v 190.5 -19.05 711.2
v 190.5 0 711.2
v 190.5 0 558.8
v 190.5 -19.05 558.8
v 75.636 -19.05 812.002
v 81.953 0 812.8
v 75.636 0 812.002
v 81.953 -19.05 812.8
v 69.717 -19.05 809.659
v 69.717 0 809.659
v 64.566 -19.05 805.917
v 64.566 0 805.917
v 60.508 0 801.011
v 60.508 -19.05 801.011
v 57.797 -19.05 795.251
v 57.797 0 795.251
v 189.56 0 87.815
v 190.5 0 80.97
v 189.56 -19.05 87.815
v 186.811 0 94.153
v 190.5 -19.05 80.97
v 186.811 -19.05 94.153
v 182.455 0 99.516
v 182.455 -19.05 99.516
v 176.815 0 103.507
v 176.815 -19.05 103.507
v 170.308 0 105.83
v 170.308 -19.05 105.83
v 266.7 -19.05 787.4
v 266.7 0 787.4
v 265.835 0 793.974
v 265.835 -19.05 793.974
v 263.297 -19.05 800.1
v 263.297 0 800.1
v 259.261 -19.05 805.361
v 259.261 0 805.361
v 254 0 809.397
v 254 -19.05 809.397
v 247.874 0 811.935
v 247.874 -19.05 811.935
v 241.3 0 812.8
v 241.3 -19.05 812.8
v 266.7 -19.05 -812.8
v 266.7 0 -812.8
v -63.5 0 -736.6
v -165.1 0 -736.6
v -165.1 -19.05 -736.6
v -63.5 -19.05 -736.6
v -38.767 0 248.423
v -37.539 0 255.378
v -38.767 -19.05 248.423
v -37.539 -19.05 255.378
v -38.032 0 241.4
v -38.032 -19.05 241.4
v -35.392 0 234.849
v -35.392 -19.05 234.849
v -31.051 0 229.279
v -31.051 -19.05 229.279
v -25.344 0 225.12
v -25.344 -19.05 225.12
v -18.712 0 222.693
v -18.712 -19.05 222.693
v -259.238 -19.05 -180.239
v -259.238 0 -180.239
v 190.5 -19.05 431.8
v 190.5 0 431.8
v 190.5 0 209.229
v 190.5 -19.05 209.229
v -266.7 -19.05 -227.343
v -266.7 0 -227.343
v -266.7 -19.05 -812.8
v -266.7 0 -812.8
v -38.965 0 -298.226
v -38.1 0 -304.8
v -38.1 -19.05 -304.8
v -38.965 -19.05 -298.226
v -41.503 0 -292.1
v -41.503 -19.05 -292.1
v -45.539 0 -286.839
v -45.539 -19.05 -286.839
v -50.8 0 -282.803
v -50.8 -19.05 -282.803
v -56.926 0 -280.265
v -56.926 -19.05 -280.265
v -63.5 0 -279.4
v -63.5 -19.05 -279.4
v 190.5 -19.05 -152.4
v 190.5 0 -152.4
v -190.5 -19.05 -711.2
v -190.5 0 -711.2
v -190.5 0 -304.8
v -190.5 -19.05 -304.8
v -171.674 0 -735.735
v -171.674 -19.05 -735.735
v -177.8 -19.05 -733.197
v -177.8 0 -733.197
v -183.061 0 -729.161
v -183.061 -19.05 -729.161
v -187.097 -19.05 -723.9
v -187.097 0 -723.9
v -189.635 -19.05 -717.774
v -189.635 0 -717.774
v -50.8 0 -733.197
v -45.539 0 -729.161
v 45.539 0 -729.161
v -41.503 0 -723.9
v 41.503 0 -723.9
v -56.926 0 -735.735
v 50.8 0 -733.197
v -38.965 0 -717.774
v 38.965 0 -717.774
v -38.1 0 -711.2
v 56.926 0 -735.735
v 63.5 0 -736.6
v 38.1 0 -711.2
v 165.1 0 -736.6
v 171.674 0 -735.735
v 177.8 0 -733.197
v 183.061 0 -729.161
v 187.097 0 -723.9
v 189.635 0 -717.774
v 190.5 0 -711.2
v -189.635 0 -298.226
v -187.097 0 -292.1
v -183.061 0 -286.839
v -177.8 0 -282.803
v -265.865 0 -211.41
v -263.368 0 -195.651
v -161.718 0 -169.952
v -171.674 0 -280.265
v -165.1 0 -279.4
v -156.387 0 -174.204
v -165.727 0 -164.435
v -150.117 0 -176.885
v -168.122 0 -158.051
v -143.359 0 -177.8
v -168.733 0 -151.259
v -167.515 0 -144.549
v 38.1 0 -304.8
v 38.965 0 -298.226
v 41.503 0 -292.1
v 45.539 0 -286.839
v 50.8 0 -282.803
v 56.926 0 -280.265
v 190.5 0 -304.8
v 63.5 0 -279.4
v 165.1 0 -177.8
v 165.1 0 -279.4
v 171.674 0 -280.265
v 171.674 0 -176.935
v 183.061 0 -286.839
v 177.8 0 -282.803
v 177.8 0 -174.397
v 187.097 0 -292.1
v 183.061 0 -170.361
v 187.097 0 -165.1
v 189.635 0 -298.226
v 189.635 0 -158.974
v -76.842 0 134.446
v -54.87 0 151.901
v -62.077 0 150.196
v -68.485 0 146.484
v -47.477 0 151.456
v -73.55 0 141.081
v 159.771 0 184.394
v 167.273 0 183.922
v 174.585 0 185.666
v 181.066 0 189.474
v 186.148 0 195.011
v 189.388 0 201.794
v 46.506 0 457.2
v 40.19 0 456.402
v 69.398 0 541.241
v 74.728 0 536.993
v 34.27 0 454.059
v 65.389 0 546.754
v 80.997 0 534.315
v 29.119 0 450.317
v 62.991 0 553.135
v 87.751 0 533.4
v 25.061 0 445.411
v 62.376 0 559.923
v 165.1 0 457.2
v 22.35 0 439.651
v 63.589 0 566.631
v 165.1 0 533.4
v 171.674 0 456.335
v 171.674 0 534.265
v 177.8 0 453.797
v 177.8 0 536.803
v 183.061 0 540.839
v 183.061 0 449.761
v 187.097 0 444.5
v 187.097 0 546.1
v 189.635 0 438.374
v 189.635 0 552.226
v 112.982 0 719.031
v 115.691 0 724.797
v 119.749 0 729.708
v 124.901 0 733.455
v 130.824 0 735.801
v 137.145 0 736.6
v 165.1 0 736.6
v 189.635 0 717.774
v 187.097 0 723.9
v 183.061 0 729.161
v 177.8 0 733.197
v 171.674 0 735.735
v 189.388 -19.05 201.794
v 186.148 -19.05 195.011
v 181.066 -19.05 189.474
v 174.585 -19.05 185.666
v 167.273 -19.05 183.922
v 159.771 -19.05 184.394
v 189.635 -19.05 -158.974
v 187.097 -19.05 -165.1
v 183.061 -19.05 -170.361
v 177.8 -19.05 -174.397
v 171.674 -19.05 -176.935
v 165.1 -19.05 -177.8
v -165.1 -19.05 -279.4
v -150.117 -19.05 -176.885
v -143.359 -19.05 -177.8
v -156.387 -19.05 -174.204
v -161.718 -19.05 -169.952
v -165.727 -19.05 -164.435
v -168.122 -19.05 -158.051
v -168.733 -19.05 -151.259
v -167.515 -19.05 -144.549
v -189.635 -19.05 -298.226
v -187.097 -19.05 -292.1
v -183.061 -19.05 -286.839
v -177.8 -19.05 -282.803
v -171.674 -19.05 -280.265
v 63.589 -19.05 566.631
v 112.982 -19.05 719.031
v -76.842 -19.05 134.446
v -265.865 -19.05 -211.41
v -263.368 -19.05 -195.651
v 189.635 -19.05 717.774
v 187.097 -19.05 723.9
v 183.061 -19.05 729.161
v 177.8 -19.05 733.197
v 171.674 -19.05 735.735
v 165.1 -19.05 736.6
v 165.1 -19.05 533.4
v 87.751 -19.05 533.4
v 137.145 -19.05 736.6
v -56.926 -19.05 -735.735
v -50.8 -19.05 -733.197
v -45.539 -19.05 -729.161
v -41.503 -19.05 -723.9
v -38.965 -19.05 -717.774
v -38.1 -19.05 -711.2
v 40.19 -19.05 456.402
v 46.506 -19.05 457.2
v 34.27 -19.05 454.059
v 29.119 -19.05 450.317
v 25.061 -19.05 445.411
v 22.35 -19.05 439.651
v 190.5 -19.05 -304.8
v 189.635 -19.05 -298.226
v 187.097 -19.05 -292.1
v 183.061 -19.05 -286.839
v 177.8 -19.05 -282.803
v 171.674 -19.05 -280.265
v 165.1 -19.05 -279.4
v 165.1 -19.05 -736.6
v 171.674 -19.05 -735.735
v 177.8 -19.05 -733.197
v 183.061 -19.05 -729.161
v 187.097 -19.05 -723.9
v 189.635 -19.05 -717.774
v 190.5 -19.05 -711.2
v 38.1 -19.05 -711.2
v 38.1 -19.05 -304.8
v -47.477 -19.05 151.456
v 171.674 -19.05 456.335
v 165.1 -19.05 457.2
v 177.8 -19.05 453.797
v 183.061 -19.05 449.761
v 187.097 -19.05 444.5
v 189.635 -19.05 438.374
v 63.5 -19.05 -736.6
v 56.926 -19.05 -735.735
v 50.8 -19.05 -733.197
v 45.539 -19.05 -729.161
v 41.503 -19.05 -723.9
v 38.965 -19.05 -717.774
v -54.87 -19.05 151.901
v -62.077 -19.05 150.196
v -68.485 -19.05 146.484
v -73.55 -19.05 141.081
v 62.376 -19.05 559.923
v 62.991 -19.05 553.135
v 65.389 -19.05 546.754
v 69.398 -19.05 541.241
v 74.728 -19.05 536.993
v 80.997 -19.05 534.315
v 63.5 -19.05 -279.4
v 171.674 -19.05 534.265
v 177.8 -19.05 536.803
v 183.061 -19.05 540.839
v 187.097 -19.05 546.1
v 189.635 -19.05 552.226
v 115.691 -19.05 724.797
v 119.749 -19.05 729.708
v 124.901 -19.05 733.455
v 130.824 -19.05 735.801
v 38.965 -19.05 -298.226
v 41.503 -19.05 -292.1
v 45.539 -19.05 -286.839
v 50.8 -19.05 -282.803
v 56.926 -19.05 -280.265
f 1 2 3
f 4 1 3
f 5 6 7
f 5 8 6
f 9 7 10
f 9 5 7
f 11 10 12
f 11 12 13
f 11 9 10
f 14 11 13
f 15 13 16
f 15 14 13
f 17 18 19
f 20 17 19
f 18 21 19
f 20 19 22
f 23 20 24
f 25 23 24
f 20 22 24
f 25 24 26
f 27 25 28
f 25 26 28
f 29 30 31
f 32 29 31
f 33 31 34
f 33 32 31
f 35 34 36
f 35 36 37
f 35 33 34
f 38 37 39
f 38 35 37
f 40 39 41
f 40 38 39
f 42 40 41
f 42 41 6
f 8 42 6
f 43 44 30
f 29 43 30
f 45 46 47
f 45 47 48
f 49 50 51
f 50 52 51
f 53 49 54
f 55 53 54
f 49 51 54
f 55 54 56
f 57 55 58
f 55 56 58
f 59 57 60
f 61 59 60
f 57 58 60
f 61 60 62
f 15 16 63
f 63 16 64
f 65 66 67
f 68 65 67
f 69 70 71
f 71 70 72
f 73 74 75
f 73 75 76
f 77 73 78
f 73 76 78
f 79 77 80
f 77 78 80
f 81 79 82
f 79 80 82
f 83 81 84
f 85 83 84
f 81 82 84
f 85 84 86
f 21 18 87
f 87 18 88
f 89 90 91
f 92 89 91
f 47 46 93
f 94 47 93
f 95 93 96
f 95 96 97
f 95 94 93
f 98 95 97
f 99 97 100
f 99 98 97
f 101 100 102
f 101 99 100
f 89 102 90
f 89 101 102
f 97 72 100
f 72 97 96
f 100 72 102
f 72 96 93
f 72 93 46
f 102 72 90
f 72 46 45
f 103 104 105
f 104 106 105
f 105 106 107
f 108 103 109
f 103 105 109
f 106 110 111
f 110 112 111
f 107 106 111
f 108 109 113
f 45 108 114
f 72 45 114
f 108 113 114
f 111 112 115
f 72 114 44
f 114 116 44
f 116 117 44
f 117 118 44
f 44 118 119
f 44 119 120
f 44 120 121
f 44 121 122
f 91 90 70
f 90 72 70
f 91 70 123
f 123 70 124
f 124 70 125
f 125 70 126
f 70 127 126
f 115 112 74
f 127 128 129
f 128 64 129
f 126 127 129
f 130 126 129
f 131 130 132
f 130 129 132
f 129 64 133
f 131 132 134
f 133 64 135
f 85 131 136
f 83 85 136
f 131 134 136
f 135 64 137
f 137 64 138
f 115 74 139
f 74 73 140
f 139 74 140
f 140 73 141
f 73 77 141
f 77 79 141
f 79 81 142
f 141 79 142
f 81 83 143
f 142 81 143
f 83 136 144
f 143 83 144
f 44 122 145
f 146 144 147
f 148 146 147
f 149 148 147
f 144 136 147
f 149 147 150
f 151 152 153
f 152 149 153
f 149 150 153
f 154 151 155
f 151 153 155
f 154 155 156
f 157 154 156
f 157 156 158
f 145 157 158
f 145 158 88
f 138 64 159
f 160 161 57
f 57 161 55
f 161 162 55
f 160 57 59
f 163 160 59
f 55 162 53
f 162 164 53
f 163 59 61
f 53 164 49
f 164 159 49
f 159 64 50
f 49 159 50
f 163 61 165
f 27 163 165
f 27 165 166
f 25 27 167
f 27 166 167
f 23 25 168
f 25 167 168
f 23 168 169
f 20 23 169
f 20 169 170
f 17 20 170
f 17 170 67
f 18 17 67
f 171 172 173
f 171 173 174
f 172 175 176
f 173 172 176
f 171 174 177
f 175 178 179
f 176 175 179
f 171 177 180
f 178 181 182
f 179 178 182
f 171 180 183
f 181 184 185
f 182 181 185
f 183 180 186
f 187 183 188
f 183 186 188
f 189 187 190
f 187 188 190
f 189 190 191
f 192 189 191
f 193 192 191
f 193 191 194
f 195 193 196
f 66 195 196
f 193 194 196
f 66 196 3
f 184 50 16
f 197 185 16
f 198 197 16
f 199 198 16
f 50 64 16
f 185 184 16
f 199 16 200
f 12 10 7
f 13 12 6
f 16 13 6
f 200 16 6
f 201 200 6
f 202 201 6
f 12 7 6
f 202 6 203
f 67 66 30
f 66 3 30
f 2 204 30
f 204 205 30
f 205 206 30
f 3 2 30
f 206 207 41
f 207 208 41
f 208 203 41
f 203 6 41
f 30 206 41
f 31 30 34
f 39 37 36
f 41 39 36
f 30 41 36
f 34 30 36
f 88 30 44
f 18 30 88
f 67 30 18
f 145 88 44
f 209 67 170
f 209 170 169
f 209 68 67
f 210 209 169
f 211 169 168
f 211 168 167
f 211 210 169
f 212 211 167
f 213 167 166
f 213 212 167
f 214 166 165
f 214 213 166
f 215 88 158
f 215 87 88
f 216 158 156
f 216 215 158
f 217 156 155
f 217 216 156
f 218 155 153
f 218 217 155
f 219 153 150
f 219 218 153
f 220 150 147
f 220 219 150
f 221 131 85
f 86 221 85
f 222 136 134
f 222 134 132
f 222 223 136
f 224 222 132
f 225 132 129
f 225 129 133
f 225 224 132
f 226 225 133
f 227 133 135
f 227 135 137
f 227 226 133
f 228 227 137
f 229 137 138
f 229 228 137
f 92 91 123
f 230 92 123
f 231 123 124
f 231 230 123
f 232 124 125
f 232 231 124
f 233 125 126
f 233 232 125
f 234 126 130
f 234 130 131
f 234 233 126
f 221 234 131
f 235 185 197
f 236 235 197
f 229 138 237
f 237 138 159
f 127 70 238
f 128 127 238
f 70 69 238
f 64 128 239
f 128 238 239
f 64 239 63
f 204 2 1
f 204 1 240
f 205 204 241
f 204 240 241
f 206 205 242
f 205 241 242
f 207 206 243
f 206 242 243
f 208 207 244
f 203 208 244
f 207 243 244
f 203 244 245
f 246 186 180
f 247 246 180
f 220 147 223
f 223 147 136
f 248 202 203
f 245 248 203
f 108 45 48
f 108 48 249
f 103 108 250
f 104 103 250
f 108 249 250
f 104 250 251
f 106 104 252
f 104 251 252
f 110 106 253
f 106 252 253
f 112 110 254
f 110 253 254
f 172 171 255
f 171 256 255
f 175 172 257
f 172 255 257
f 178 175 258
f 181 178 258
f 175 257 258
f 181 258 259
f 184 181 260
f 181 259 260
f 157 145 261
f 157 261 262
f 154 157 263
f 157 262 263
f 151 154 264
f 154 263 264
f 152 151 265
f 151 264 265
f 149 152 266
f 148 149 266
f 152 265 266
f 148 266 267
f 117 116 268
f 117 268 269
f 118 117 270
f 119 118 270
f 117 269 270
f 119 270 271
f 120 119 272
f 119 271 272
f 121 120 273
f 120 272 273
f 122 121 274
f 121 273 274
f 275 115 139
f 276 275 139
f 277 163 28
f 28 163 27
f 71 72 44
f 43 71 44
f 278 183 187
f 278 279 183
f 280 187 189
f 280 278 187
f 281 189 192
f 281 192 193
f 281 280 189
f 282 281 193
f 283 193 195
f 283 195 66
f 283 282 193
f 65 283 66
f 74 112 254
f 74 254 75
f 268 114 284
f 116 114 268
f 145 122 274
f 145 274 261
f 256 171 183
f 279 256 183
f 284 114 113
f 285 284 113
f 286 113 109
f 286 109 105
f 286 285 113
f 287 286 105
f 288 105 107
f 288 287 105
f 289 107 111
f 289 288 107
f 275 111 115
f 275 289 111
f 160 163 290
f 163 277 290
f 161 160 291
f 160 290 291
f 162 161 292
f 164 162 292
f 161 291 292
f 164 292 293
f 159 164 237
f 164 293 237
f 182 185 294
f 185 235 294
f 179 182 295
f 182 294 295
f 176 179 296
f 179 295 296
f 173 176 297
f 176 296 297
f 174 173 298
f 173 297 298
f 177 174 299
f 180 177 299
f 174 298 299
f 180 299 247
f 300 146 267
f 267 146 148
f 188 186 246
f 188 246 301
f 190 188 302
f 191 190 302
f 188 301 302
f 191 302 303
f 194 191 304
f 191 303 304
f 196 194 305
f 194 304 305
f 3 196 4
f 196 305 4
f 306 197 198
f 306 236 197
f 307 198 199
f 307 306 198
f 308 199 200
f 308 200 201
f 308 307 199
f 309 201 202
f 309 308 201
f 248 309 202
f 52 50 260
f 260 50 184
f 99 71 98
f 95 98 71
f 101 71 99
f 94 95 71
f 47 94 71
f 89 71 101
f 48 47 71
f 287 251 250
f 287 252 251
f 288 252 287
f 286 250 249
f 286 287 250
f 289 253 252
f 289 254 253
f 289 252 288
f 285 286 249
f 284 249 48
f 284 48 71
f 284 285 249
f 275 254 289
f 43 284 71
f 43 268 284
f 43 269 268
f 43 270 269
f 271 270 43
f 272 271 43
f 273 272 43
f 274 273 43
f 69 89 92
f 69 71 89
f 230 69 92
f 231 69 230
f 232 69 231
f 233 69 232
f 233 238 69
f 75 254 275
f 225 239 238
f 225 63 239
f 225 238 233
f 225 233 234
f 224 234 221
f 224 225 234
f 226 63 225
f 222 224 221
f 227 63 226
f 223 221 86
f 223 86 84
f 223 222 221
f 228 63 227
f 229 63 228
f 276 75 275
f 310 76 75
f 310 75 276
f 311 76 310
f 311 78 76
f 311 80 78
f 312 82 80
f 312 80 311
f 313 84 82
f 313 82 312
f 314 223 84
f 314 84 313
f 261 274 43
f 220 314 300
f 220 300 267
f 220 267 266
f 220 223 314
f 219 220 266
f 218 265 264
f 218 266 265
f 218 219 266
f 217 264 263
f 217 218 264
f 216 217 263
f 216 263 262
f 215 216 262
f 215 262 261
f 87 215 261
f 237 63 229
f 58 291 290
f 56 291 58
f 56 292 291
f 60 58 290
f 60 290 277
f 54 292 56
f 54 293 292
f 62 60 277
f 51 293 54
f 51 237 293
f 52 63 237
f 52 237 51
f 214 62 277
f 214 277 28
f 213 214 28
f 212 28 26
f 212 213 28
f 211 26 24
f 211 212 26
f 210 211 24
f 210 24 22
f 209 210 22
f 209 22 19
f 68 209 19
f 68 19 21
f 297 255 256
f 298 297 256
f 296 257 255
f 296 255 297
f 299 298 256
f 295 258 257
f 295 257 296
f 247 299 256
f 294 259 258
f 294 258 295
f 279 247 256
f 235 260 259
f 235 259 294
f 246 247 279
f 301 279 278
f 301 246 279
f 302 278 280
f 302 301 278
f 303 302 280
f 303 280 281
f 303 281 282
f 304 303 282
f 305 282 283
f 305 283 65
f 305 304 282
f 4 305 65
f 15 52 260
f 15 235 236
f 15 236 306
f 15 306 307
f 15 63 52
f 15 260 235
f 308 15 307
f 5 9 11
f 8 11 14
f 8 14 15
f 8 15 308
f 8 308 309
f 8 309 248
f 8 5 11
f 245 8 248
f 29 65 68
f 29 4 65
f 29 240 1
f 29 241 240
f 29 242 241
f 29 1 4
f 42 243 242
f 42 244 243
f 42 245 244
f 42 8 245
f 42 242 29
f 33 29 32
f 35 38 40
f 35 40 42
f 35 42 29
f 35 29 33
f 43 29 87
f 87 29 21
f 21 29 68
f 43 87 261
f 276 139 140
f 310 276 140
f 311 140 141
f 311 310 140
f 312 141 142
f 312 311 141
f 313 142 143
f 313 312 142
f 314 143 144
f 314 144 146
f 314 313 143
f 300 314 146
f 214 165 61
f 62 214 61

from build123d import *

# Parameters (mm, degrees)
F0_W     = 152.4
F0_H     = 457.2
F1_DEPTH = 19.05
F2_R     = 25.4
F4_R     = 152.4


# Not quite as in the source:
# - two fillets or chamfers of one size are made in one step


with BuildPart() as f1:
    # F0 (on Front) → F1 (new body)
    with BuildSketch(Plane.XZ):
        Polygon((266.7, -812.8), (266.7, 812.8), (63.5, 812.8), (-266.7, -203.2), (-266.7, -812.8), align=None)
        with Locations((-114.3, -508)):
            Rectangle(F0_W, F0_H, mode=Mode.SUBTRACT)
        with Locations((114.3, -508)):
            Rectangle(F0_W, F0_H, mode=Mode.SUBTRACT)
        Polygon((190.5, -177.8), (-178.3216873813, -177.8), (-79.2616873813, 127), (-69.7940460934, 156.1312039627), (190.5, 101.6), align=None, mode=Mode.SUBTRACT)
        Polygon((190.5, 457.2), (190.5, 228.6), (190.5, 177.8), (-46.2416873813, 228.6), (28.0533126187, 457.2), align=None, mode=Mode.SUBTRACT)
        Polygon((118.67604537, 736.6), (190.5, 736.6), (190.5, 533.4), (52.8183126187, 533.4), align=None, mode=Mode.SUBTRACT)
    extrude(amount=F1_DEPTH)

    # F2
    f2_edges = [f1.edges().sort_by_distance(p)[0] for p in [
        (28.053313, -9.525, 457.2),
        (-178.321687, -9.525, -177.8),
        (-190.5, -9.525, -279.4),
        (38.1, -9.525, -279.4),
        (-38.1, -9.525, -279.4),
        (190.5, -9.525, -279.4),
        (190.5, -9.525, 457.2),
        (190.5, -9.525, -177.8),
        (-190.5, -9.525, -736.6),
        (38.1, -9.525, -736.6),
        (-38.1, -9.525, -736.6),
        (190.5, -9.525, -736.6),
        (190.5, -9.525, 533.4),
        (266.7, -9.525, 812.8),
        (52.818313, -9.525, 533.4),
        (190.5, -9.525, 736.6),
        (118.676045, -9.525, 736.6),
        (190.5, -9.525, 177.8),
        (-46.241687, -9.525, 228.6),
        (-69.794046, -9.525, 156.131204),
        (190.5, -9.525, 101.6),
        (63.5, -9.525, 812.8),
    ]]
    fillet(f2_edges, radius=F2_R)

    # F4
    f4_edges = [f1.edges().sort_by_distance(p)[0] for p in [
        (-266.7, -9.525, -203.2),
    ]]
    fillet(f4_edges, radius=F4_R)


solid = f1.part
